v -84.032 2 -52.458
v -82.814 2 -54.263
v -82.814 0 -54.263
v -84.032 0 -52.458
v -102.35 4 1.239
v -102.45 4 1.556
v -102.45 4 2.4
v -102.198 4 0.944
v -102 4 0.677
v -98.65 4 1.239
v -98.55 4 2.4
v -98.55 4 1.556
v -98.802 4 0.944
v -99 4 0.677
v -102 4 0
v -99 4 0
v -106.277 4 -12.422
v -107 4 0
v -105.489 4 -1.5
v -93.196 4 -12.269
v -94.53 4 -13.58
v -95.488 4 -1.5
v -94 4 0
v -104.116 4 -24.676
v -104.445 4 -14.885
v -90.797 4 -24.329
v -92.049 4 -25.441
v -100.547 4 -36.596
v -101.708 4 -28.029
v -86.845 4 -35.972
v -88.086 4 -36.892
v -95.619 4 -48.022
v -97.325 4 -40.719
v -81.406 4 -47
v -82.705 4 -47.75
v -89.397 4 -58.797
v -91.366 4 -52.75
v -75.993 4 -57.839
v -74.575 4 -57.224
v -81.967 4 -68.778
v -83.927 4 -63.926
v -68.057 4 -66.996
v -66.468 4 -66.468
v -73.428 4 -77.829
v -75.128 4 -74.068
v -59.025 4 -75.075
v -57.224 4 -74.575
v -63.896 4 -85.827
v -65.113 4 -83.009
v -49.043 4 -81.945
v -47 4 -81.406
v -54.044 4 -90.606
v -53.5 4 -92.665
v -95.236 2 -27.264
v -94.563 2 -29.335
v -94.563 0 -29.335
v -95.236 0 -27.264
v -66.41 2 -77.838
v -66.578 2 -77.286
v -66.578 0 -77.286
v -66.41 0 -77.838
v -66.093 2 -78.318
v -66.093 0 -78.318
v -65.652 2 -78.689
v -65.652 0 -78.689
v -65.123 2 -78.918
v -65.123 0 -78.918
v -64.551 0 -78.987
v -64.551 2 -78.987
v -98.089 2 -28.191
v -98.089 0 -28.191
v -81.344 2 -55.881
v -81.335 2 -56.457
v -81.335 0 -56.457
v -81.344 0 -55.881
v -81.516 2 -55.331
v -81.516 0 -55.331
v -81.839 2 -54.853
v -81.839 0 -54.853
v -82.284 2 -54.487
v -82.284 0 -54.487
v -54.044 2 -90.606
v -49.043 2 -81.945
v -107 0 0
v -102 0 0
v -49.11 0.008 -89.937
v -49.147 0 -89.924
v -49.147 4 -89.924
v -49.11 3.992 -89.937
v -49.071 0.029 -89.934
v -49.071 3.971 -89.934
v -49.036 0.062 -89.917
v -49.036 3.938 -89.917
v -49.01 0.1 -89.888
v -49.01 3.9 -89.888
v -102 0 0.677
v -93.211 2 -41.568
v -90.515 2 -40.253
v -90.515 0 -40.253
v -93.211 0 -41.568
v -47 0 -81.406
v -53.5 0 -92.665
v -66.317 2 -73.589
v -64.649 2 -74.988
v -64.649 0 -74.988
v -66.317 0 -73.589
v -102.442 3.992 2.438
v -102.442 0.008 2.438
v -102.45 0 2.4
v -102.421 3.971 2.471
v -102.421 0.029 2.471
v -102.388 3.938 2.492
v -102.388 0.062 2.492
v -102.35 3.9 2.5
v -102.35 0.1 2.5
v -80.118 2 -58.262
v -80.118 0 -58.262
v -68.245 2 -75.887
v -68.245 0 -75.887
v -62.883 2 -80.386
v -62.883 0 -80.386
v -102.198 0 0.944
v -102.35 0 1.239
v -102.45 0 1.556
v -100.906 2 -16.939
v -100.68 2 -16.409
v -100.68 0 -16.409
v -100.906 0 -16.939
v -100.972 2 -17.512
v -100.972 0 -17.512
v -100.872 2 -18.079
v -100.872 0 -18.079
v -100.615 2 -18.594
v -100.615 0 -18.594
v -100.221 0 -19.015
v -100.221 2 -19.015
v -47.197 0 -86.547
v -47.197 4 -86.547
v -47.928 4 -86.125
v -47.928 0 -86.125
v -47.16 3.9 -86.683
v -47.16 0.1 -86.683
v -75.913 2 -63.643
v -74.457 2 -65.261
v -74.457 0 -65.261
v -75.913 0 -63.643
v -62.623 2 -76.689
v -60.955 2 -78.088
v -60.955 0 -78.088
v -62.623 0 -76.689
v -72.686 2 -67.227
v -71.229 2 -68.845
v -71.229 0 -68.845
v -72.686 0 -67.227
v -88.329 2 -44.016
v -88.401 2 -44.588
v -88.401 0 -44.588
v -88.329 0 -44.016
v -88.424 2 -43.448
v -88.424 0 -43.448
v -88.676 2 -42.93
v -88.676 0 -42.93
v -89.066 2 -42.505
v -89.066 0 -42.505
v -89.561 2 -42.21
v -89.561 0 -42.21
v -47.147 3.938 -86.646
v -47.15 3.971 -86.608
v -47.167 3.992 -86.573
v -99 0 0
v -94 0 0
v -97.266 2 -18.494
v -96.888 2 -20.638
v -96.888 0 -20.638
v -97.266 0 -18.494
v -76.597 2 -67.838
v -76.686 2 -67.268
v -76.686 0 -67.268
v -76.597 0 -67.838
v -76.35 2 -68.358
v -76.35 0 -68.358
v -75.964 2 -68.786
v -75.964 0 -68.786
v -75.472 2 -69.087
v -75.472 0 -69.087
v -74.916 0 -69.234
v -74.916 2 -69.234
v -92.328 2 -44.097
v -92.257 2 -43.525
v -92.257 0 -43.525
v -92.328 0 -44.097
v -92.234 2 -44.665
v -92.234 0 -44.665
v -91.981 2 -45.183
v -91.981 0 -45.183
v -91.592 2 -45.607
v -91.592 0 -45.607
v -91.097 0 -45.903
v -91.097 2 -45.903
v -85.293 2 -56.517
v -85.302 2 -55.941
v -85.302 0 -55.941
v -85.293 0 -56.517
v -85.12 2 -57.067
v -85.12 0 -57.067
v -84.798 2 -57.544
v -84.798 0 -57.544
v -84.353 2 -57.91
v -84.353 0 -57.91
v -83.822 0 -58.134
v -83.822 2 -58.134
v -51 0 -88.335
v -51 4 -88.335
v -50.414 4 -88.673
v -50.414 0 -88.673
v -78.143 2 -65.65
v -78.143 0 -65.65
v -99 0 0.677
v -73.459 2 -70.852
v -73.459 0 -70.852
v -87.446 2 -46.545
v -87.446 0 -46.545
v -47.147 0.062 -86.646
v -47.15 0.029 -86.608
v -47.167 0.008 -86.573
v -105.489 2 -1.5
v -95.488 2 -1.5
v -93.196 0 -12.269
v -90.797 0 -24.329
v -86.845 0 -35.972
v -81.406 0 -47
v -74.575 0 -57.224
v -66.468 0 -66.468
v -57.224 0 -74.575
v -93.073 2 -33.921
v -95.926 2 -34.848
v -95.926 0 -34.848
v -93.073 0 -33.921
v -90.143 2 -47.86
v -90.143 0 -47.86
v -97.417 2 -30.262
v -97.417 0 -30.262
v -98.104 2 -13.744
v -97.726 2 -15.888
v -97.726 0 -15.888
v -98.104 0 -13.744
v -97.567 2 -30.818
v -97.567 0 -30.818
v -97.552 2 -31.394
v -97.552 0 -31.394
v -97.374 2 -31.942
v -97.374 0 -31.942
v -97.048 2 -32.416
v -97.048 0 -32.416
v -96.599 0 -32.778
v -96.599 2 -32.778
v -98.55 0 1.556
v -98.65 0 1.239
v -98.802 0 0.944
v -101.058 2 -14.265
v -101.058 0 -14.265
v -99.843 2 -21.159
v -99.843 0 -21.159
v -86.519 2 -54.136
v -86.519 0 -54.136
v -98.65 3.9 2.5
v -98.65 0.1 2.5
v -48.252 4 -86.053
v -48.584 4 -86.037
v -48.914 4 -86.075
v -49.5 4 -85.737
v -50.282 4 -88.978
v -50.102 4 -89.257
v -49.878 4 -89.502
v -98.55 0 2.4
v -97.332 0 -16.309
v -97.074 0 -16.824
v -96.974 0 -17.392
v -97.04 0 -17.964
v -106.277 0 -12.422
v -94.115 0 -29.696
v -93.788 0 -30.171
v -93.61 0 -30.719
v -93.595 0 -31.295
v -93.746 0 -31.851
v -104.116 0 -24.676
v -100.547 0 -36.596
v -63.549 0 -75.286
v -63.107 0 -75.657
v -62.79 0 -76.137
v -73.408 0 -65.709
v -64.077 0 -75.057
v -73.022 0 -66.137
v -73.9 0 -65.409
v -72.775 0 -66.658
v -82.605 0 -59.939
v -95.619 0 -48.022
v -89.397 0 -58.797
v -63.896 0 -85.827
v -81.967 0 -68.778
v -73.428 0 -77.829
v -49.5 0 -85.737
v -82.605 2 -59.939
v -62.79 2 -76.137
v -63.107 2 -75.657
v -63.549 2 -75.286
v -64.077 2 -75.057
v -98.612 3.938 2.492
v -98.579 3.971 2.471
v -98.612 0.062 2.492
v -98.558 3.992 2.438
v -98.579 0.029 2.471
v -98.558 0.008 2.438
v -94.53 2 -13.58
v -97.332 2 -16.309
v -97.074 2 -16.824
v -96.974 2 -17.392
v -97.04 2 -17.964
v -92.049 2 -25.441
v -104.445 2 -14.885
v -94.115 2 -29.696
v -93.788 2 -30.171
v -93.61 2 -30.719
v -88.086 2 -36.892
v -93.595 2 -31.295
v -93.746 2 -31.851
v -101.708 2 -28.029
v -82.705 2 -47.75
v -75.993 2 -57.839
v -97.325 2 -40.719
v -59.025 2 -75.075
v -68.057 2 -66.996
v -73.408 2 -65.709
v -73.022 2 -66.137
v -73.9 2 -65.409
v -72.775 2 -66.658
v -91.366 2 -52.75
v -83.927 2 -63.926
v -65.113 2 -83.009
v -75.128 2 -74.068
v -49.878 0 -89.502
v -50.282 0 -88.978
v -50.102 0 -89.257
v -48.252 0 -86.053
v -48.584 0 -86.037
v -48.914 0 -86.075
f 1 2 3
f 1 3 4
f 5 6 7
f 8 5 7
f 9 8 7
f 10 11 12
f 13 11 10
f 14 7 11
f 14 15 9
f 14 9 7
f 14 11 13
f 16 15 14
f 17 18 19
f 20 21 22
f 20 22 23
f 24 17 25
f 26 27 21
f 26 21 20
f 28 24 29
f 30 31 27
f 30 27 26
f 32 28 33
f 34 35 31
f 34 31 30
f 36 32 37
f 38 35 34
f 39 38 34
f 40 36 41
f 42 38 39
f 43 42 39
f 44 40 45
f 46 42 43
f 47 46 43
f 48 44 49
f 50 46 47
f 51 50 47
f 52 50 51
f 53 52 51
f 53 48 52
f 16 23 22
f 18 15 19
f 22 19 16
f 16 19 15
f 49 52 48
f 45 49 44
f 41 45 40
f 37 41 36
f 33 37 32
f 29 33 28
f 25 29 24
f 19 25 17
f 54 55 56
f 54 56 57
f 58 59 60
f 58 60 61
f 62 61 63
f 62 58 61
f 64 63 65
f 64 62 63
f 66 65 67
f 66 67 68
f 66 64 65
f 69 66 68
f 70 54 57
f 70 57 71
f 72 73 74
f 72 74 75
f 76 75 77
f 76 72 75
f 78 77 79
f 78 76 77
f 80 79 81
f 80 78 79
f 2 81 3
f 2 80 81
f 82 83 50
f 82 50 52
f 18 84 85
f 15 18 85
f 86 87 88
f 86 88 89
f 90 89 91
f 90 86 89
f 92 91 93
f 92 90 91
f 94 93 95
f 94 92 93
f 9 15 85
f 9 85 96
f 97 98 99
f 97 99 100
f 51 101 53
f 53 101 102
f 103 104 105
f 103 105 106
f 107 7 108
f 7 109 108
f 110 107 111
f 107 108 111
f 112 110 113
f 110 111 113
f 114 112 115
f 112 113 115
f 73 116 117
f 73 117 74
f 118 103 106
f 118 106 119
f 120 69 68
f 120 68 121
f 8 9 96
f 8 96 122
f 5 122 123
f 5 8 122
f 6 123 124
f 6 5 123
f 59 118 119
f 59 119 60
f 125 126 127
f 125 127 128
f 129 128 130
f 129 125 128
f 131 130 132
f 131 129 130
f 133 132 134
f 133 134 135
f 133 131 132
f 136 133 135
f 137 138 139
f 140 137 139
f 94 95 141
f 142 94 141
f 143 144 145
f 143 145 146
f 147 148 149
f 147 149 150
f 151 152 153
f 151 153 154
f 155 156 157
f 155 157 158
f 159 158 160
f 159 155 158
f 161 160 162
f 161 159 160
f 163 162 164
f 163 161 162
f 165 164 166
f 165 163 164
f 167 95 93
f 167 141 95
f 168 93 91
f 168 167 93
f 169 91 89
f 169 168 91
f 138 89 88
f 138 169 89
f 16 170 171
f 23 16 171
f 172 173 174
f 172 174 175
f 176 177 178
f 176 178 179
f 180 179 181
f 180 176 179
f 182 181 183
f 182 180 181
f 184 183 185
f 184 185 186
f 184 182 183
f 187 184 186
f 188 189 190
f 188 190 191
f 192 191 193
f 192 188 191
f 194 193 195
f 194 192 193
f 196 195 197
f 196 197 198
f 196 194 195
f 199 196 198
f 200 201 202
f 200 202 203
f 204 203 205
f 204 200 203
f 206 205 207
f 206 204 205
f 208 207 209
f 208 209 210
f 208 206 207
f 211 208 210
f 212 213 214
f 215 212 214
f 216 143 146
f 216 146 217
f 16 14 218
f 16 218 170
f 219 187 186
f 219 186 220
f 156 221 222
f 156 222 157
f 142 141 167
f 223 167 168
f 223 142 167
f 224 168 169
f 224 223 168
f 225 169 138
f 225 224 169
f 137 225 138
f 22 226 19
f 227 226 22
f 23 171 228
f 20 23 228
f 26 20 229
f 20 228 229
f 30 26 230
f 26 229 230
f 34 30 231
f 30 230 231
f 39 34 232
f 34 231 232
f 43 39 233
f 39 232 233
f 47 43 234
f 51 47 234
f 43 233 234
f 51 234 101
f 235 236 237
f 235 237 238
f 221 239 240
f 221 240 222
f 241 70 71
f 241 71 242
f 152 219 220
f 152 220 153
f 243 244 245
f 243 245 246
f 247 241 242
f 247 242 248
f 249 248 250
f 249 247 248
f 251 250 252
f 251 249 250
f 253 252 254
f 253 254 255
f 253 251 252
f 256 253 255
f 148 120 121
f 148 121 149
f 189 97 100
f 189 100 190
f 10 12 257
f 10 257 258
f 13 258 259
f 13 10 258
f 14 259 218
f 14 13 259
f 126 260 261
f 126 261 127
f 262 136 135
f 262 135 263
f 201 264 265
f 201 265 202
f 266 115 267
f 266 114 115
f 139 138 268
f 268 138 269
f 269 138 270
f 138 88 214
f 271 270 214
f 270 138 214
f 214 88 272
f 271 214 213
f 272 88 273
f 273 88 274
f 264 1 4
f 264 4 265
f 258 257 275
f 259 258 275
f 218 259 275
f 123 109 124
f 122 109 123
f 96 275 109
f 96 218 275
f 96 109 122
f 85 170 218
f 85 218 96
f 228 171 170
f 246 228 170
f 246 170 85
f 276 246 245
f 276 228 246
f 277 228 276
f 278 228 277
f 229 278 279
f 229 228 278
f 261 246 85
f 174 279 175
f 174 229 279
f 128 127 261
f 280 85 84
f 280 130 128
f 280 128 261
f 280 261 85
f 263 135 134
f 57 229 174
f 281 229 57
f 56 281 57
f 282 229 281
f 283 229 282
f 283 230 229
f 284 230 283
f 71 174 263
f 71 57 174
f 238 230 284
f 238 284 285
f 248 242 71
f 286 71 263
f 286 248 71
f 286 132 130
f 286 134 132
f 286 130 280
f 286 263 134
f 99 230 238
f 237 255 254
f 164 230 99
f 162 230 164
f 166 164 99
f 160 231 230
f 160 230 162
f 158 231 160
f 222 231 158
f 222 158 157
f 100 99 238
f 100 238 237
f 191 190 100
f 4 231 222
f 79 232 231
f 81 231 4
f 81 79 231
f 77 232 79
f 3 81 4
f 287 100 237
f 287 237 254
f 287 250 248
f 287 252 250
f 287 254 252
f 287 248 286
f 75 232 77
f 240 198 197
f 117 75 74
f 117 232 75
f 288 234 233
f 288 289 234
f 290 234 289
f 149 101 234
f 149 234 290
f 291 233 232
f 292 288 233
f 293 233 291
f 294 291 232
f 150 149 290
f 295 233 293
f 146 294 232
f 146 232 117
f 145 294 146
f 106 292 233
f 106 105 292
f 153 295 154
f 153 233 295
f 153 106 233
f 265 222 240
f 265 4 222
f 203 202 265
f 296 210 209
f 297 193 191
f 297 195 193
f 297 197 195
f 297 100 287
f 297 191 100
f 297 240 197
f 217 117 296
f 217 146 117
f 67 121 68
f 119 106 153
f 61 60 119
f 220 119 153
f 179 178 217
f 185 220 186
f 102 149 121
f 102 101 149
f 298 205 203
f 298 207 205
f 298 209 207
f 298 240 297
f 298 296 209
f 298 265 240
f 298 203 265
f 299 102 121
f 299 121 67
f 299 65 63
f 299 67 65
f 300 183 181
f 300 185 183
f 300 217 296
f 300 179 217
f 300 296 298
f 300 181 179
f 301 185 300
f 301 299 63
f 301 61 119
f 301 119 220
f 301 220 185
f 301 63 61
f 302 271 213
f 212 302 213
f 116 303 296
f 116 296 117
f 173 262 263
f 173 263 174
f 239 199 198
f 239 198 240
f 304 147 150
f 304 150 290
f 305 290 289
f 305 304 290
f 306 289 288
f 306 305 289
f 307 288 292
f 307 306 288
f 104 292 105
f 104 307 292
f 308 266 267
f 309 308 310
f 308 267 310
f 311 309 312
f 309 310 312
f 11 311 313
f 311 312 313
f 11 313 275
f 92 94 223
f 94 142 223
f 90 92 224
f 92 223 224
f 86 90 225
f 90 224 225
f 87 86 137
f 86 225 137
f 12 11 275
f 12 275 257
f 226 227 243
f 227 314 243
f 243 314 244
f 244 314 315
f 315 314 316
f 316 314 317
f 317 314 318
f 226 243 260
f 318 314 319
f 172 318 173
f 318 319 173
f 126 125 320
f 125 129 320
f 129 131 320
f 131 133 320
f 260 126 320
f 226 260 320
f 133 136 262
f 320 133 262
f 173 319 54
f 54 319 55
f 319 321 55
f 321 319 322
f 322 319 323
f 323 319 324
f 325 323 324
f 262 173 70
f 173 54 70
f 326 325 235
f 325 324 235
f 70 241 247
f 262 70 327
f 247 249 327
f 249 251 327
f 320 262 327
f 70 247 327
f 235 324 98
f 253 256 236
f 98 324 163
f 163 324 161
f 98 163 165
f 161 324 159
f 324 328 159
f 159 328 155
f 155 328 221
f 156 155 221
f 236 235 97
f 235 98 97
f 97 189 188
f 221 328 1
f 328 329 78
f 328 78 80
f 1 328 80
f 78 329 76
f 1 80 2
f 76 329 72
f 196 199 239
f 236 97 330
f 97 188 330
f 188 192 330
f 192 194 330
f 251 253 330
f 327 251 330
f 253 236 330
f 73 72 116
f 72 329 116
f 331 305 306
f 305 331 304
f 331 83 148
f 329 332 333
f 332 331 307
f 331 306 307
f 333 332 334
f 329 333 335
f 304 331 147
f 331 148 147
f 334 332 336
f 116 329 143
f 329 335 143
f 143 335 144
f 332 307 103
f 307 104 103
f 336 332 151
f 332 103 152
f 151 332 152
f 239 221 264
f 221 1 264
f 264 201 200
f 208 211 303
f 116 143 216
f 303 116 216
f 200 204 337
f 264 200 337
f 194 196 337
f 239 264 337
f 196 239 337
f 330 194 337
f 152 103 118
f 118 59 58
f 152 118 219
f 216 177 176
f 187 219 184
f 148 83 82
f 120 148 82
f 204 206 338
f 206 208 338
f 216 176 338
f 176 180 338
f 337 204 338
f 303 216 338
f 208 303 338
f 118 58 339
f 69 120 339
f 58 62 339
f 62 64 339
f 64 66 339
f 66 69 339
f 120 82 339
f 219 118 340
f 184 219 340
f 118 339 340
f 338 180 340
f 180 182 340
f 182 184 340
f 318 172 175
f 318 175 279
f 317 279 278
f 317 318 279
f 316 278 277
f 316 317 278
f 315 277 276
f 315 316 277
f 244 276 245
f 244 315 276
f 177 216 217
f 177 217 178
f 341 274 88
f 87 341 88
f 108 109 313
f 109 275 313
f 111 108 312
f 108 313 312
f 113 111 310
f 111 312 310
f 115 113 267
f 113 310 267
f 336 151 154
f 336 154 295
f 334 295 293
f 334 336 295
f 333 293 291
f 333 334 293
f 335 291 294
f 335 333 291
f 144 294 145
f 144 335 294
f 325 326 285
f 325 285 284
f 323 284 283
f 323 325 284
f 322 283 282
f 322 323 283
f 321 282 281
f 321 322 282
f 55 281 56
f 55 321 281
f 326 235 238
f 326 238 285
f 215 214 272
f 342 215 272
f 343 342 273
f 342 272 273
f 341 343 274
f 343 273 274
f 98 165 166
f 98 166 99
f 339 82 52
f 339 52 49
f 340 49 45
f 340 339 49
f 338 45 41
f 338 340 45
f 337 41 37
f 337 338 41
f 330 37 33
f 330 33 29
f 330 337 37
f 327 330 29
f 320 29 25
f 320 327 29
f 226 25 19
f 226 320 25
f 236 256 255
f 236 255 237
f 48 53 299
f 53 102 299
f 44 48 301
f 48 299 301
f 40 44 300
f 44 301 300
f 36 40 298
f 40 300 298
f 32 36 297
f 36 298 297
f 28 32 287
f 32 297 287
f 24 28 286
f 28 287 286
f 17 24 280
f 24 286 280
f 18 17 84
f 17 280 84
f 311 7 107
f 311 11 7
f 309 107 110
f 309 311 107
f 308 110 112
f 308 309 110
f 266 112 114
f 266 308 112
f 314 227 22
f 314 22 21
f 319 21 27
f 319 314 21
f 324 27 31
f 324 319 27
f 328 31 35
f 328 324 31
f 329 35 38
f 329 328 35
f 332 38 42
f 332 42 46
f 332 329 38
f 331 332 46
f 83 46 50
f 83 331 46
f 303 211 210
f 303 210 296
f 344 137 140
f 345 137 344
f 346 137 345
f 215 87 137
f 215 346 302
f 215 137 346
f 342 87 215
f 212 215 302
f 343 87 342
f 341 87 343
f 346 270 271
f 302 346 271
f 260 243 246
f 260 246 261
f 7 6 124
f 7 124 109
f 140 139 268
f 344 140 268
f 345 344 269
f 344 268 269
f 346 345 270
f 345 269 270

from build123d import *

# Parameters (mm, degrees)
EXTRUDE_1_DEPTH          = 2
EXTRUDE_2_DEPTH          = 2
EXTRUDE_3_DEPTH          = 4
EXTRUDE_4_DEPTH          = 4
CUT_EXTRUDE_1_DEPTH      = 2
PATTERN_CIRCULAR_1_COUNT = 3
PATTERN_CIRCULAR_1_ANGLE = 16
PATTERN_CIRCULAR_2_COUNT = 4
PATTERN_CIRCULAR_2_ANGLE = 24
FILLET_1_R               = 0.1
FILLET_2_R               = 0.1


with BuildPart() as part:
    # 草图1 → 凸台-拉伸1 (new body)
    with BuildSketch(Plane(origin=(0, 0, 0), x_dir=(1, 0, 0), z_dir=(0, 1, 0))):
        with BuildLine():
            Line((-94, 0), (-107, 0))
            ThreePointArc((-107, 0), (-92.664718205, 53.5), (-53.5, 92.664718205))
            Line((-53.5, 92.664718205), (-47, 81.406387956))
            ThreePointArc((-47, 81.406387956), (-81.406387956, 47), (-94, 0))
        make_face()
    extrude(amount=EXTRUDE_1_DEPTH)

    # 草图2 → 凸台-拉伸2 (add)
    with BuildSketch(Plane(origin=(0, 2, 0), x_dir=(1, 0, 0), z_dir=(0, 1, 0))):
        with BuildLine():
            Line((-47, 81.406387956), (-53.5, 92.664718205))
            ThreePointArc((-53.5, 92.664718205), (-92.664718205, 53.5), (-107, 0))
            Line((-107, 0), (-94, 0))
            ThreePointArc((-94, 0), (-81.406387956, 47), (-47, 81.406387956))
        make_face()
        with BuildLine():
            Line((-105.489335954, 1.5), (-95.488219169, 1.5))
            ThreePointArc((-95.488219169, 1.5), (-82.705426061, 47.75), (-49.04314769, 81.945223562))
            Line((-49.04314769, 81.945223562), (-54.043706083, 90.606444764))
            ThreePointArc((-54.043706083, 90.606444764), (-91.365680099, 52.75), (-105.489335954, 1.5))
        make_face(mode=Mode.SUBTRACT)
    extrude(amount=EXTRUDE_2_DEPTH)

    # 草图4 → 凸台-拉伸4 (add)
    with BuildSketch(Plane(origin=(0, 4, 0), x_dir=(1, 0, 0), z_dir=(0, 1, 0))):
        with BuildLine():
            Line((-99, 0), (-102, 0))
            Line((-102, 0), (-102, -0.677124344))
            ThreePointArc((-102, -0.677124344), (-102.280042303, -1.088161527), (-102.45, -1.555590279))
            Line((-102.45, -1.555590279), (-102.45, -2.5))
            Line((-102.45, -2.5), (-98.55, -2.5))
            Line((-98.55, -2.5), (-98.55, -1.555590279))
            ThreePointArc((-98.55, -1.555590279), (-98.719957697, -1.088161527), (-99, -0.677124344))
            Line((-99, -0.677124344), (-99, 0))
        make_face()
    extrude(amount=-EXTRUDE_4_DEPTH)

    # 草图5 → 切除-拉伸1 (cut)
    with BuildSketch(Plane(origin=(0, 2, 0), x_dir=(1, 0, 0), z_dir=(0, 1, 0))):
        with BuildLine():
            Line((-87.44631157, 46.544522694), (-88.400700065, 44.587736295))
            ThreePointArc((-88.400700065, 44.587736295), (-88.53121356, 43.179557959), (-89.560521102, 42.209750769))
            Line((-89.560521102, 42.209750769), (-90.514909597, 40.25296437))
            Line((-90.514909597, 40.25296437), (-93.211291736, 41.56807781))
            Line((-93.211291736, 41.56807781), (-92.256903241, 43.524864209))
            ThreePointArc((-92.256903241, 43.524864209), (-92.126389746, 44.933042546), (-91.097082204, 45.902849736))
            Line((-91.097082204, 45.902849736), (-90.142693709, 47.859636135))
            Line((-90.142693709, 47.859636135), (-87.44631157, 46.544522694))
        make_face()
    cut_extrude_1 = extrude(amount=-CUT_EXTRUDE_1_DEPTH, mode=Mode.SUBTRACT)

    # 阵列(圆周)1: 切除-拉伸1 ×3 about axis
    pattern_circular_1_axis = Axis((0, 0, 0), (0, 1, 0))
    for i in range(1, PATTERN_CIRCULAR_1_COUNT):
        add(cut_extrude_1.rotate(pattern_circular_1_axis, i * PATTERN_CIRCULAR_1_ANGLE / (PATTERN_CIRCULAR_1_COUNT - 1)), mode=Mode.SUBTRACT)

    # 阵列(圆周)2: 切除-拉伸1 ×4 about axis
    pattern_circular_2_axis = Axis((0, 0, 0), (0, -1, 0))
    for i in range(1, PATTERN_CIRCULAR_2_COUNT):
        add(cut_extrude_1.rotate(pattern_circular_2_axis, i * PATTERN_CIRCULAR_2_ANGLE / (PATTERN_CIRCULAR_2_COUNT - 1)), mode=Mode.SUBTRACT)

    # 圆角1
    fillet_1_edges = [part.edges().sort_by_distance(p)[0] for p in [
        (-100.5, 0, 2.5),
        (-98.55, 2, 2.5),
        (-102.45, 2, 2.5),
        (-100.5, 4, 2.5),
    ]]
    fillet(fillet_1_edges, radius=FILLET_1_R)


with BuildPart() as body_2:
    # 草图3 → 凸台-拉伸3 (new body)
    with BuildSketch(Plane(origin=(0, 4, 0), x_dir=(1, 0, 0), z_dir=(0, 1, 0))):
        with BuildLine():
            Line((-49.5, 85.736514975), (-51, 88.334591186))
            Line((-51, 88.334591186), (-50.413593116, 88.673153358))
            ThreePointArc((-50.413593116, 88.673153358), (-50.197645625, 89.121195698), (-49.8778193, 89.502097757))
            Line((-49.8778193, 89.502097757), (-49.059936491, 89.974302618))
            Line((-49.059936491, 89.974302618), (-47.109936491, 86.596803543))
            Line((-47.109936491, 86.596803543), (-47.9278193, 86.124598683))
            ThreePointArc((-47.9278193, 86.124598683), (-48.417603323, 86.03807199), (-48.913593116, 86.075077147))
            Line((-48.913593116, 86.075077147), (-49.5, 85.736514975))
        make_face()
    extrude(amount=-EXTRUDE_3_DEPTH)

    # 圆角2
    fillet_2_edges = [body_2.edges().sort_by_distance(p)[0] for p in [
        (-48.084936491, 4, -88.28555308),
        (-49.059936491, 2, -89.974302618),
        (-47.109936491, 2, -86.596803543),
        (-48.084936491, 0, -88.28555308),
    ]]
    fillet(fillet_2_edges, radius=FILLET_2_R)


solid = Compound([part.part, body_2.part])
